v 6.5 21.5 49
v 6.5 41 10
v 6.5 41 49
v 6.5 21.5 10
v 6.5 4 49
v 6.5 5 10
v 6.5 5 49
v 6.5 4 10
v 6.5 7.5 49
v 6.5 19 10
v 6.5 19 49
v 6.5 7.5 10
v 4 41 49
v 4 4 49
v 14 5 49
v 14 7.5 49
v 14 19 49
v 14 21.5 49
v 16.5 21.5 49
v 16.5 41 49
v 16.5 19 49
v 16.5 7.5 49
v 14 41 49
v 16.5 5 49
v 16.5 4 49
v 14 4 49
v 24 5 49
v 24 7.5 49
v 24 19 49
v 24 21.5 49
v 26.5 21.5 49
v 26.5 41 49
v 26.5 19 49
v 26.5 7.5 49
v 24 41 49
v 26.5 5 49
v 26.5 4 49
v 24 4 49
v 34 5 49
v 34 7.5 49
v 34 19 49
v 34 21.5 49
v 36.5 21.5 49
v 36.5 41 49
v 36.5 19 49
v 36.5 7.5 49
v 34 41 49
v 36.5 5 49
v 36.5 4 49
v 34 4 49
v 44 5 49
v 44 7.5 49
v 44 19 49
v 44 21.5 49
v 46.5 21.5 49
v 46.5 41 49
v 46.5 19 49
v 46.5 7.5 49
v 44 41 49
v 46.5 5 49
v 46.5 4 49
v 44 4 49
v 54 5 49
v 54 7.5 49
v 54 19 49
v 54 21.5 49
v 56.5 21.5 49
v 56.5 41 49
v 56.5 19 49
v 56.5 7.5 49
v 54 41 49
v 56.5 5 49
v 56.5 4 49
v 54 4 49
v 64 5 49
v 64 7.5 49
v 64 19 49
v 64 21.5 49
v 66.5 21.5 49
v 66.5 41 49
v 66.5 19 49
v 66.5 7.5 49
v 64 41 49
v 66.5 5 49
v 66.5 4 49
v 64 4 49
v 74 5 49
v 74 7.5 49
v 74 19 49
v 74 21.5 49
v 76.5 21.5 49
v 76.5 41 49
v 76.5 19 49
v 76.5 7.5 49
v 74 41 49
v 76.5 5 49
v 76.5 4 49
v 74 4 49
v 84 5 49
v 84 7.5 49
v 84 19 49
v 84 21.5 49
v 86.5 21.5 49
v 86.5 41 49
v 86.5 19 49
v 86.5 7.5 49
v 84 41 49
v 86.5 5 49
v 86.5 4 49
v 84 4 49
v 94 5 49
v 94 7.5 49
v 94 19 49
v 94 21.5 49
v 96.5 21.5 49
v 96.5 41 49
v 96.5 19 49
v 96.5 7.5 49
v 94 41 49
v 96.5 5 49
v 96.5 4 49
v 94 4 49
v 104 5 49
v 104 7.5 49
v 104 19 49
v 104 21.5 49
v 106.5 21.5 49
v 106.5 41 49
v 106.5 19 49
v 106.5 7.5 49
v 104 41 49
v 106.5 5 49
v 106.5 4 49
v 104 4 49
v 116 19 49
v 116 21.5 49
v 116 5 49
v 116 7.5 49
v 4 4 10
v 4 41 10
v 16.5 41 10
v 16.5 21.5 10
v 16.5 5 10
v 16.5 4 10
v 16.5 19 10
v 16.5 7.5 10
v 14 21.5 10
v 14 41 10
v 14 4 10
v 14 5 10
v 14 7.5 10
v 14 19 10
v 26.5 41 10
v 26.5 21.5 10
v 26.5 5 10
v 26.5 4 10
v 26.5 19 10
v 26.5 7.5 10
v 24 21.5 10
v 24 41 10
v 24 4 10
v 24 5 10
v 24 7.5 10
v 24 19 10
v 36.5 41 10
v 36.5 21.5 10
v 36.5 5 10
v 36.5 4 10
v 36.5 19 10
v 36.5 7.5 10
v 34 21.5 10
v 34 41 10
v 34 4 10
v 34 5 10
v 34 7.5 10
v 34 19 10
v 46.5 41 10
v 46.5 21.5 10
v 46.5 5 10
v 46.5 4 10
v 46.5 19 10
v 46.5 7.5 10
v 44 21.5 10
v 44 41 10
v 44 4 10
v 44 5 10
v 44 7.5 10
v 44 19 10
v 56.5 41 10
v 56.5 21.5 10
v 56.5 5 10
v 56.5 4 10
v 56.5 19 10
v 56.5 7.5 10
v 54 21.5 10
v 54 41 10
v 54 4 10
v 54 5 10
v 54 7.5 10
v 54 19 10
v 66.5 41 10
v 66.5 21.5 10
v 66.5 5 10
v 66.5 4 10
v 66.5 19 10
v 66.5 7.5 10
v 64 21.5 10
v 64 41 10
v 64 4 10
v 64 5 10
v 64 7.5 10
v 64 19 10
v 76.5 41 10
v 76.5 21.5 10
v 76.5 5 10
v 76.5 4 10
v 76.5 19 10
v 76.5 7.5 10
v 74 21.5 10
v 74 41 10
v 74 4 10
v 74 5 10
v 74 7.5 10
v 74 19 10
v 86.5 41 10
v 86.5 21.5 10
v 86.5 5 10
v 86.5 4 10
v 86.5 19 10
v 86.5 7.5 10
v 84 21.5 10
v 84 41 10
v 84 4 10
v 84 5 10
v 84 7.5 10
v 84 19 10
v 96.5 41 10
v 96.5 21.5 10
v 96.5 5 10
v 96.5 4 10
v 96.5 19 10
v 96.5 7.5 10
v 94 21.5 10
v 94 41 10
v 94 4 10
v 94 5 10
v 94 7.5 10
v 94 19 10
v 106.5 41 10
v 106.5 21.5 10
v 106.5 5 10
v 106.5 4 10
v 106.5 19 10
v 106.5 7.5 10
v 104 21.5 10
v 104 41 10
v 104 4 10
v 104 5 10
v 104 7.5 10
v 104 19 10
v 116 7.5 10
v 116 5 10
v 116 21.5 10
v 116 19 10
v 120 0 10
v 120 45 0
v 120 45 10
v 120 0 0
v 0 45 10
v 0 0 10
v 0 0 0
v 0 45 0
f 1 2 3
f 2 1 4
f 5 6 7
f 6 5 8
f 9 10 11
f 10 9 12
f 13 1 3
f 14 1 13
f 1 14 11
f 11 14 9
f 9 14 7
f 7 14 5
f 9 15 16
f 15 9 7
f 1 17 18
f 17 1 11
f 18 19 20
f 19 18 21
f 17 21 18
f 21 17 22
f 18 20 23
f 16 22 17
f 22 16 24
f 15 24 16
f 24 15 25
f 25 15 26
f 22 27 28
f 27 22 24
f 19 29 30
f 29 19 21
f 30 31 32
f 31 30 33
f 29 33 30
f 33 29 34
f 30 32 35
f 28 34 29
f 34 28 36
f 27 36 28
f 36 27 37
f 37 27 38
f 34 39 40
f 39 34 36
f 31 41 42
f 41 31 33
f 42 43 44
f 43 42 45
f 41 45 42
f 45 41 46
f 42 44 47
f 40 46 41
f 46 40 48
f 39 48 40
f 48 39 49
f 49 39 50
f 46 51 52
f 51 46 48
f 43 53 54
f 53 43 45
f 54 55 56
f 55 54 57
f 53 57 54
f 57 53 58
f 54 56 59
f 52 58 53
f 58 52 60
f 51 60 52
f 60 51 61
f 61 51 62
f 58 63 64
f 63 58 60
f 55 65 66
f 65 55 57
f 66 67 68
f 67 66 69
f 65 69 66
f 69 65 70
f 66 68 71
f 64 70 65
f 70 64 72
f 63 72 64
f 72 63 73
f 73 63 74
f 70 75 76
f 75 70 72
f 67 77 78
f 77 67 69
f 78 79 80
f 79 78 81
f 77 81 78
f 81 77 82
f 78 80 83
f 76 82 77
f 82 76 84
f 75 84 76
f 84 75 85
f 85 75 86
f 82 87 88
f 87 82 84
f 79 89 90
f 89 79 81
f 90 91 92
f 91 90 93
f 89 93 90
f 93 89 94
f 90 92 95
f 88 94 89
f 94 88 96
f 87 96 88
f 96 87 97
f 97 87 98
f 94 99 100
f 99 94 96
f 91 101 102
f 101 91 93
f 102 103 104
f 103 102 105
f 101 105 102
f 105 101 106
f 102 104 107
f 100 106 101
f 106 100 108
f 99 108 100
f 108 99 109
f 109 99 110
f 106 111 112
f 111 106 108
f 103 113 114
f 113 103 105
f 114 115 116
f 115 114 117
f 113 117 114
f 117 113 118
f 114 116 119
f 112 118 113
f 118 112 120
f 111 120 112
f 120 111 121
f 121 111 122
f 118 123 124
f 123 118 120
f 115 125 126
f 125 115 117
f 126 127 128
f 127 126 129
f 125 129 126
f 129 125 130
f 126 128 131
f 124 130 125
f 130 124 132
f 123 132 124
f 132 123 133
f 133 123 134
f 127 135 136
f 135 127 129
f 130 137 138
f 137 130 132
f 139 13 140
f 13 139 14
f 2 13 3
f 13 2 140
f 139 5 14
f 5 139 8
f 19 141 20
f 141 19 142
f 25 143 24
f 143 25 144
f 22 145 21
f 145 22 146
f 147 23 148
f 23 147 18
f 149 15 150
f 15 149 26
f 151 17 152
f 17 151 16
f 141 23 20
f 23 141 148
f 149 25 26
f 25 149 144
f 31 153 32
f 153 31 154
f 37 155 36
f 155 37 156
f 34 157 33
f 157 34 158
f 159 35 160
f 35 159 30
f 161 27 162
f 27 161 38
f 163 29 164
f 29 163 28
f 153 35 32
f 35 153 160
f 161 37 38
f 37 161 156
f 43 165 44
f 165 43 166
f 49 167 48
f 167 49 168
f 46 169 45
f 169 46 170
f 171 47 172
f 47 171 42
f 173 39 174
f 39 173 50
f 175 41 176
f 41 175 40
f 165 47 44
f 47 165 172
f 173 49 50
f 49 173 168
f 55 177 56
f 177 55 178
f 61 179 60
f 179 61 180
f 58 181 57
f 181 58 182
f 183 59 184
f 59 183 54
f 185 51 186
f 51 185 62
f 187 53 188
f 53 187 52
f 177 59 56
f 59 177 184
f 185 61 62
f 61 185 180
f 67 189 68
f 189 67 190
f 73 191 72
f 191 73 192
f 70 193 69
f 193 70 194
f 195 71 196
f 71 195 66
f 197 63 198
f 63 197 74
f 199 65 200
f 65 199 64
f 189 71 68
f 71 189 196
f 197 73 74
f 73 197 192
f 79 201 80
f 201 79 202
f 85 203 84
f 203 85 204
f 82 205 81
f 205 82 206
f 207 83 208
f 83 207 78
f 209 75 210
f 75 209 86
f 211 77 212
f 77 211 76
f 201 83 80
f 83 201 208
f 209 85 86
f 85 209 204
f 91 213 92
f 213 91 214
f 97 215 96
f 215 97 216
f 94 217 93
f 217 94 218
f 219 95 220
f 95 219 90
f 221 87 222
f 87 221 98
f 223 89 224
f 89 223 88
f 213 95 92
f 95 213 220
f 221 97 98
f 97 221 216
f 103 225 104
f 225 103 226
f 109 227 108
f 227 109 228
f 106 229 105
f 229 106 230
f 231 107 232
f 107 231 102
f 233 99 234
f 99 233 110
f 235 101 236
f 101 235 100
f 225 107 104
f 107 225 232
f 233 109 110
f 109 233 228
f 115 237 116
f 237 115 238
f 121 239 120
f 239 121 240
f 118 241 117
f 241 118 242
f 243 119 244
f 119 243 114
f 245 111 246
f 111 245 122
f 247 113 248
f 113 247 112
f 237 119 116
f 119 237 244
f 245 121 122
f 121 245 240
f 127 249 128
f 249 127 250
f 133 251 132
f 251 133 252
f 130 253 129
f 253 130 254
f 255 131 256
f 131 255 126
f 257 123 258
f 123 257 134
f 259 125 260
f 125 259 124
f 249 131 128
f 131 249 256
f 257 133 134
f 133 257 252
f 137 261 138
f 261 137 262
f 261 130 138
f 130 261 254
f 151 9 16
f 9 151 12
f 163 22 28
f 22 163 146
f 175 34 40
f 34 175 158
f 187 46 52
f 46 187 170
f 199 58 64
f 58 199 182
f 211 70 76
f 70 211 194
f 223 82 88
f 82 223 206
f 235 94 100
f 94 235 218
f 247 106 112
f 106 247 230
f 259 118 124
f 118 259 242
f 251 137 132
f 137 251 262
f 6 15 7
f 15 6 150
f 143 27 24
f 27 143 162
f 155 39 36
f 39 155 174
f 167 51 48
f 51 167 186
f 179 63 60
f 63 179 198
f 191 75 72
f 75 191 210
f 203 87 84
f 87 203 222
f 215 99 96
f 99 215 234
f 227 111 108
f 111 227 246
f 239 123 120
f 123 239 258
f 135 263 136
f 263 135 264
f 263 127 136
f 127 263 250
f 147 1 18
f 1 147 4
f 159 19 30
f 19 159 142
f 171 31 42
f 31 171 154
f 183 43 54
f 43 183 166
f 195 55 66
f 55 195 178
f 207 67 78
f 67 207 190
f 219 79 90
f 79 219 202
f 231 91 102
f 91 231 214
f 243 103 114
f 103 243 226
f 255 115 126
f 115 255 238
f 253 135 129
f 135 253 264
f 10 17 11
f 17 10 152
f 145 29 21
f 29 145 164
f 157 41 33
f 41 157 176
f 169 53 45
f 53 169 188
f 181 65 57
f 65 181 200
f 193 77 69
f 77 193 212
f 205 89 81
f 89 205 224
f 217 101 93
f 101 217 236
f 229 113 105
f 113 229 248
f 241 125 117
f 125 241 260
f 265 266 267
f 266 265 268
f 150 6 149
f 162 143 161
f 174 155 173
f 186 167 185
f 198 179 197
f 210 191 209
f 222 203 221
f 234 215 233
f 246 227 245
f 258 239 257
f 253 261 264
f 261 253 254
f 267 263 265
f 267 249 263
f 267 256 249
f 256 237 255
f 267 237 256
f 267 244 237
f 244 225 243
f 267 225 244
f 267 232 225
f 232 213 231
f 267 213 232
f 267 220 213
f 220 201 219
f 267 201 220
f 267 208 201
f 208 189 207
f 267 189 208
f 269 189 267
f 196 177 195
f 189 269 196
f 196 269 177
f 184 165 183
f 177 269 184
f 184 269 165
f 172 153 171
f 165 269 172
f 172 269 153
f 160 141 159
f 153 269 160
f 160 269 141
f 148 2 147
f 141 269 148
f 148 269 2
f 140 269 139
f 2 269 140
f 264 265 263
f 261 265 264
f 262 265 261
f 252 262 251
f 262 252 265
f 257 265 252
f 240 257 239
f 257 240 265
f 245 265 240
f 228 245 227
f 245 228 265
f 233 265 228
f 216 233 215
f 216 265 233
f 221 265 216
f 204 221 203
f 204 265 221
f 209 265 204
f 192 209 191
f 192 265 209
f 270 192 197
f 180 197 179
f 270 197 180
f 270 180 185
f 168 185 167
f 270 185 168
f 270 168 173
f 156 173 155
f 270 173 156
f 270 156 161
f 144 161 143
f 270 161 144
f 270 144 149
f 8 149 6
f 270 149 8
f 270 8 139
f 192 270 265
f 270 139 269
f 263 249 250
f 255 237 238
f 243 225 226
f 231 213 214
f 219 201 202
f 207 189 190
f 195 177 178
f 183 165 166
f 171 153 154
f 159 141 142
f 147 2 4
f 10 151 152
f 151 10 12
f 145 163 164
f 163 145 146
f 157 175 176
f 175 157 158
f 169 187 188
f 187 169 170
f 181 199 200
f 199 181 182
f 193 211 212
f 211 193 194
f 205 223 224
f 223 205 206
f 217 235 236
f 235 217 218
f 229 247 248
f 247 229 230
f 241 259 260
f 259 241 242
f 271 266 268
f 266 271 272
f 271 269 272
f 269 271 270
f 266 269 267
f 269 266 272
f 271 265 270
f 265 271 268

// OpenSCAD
$fn = 32;

// ----------------------------------------------------------------------
// Heatsink: cross fin block
// ----------------------------------------------------------------------

// --- parameters (mm) ---
base_l = 120;             // base length, X
base_w = 45;              // base width, Y
base_t = 10;              // base plate thickness
fin_h = 40;               // fin height above the base
fin_t = 2.5;              // fin thickness
edge = 4;                 // margin from the base ends
pitch = 10;               // fin pitch
rib_pitch = 14;           // cross rib pitch

n_fins = floor((base_l - 2 * edge - fin_t) / pitch) + 1;  // fin count
total_h = base_t + fin_h - 1;  // overall height
n_ribs = floor((base_w - 2 * edge) / rib_pitch);  // rib count

union() {
  cube([base_l, base_w, base_t]);
  for (i = [0 : n_fins - 1])
    translate([edge + i * pitch, edge, base_t - 1])
      cube([fin_t, base_w - 2 * edge, fin_h]);
  for (i = [0 : n_ribs - 1])
    translate([edge, edge + 1 + i * rib_pitch, base_t - 1])
      cube([base_l - 2 * edge, fin_t, fin_h]);
}
